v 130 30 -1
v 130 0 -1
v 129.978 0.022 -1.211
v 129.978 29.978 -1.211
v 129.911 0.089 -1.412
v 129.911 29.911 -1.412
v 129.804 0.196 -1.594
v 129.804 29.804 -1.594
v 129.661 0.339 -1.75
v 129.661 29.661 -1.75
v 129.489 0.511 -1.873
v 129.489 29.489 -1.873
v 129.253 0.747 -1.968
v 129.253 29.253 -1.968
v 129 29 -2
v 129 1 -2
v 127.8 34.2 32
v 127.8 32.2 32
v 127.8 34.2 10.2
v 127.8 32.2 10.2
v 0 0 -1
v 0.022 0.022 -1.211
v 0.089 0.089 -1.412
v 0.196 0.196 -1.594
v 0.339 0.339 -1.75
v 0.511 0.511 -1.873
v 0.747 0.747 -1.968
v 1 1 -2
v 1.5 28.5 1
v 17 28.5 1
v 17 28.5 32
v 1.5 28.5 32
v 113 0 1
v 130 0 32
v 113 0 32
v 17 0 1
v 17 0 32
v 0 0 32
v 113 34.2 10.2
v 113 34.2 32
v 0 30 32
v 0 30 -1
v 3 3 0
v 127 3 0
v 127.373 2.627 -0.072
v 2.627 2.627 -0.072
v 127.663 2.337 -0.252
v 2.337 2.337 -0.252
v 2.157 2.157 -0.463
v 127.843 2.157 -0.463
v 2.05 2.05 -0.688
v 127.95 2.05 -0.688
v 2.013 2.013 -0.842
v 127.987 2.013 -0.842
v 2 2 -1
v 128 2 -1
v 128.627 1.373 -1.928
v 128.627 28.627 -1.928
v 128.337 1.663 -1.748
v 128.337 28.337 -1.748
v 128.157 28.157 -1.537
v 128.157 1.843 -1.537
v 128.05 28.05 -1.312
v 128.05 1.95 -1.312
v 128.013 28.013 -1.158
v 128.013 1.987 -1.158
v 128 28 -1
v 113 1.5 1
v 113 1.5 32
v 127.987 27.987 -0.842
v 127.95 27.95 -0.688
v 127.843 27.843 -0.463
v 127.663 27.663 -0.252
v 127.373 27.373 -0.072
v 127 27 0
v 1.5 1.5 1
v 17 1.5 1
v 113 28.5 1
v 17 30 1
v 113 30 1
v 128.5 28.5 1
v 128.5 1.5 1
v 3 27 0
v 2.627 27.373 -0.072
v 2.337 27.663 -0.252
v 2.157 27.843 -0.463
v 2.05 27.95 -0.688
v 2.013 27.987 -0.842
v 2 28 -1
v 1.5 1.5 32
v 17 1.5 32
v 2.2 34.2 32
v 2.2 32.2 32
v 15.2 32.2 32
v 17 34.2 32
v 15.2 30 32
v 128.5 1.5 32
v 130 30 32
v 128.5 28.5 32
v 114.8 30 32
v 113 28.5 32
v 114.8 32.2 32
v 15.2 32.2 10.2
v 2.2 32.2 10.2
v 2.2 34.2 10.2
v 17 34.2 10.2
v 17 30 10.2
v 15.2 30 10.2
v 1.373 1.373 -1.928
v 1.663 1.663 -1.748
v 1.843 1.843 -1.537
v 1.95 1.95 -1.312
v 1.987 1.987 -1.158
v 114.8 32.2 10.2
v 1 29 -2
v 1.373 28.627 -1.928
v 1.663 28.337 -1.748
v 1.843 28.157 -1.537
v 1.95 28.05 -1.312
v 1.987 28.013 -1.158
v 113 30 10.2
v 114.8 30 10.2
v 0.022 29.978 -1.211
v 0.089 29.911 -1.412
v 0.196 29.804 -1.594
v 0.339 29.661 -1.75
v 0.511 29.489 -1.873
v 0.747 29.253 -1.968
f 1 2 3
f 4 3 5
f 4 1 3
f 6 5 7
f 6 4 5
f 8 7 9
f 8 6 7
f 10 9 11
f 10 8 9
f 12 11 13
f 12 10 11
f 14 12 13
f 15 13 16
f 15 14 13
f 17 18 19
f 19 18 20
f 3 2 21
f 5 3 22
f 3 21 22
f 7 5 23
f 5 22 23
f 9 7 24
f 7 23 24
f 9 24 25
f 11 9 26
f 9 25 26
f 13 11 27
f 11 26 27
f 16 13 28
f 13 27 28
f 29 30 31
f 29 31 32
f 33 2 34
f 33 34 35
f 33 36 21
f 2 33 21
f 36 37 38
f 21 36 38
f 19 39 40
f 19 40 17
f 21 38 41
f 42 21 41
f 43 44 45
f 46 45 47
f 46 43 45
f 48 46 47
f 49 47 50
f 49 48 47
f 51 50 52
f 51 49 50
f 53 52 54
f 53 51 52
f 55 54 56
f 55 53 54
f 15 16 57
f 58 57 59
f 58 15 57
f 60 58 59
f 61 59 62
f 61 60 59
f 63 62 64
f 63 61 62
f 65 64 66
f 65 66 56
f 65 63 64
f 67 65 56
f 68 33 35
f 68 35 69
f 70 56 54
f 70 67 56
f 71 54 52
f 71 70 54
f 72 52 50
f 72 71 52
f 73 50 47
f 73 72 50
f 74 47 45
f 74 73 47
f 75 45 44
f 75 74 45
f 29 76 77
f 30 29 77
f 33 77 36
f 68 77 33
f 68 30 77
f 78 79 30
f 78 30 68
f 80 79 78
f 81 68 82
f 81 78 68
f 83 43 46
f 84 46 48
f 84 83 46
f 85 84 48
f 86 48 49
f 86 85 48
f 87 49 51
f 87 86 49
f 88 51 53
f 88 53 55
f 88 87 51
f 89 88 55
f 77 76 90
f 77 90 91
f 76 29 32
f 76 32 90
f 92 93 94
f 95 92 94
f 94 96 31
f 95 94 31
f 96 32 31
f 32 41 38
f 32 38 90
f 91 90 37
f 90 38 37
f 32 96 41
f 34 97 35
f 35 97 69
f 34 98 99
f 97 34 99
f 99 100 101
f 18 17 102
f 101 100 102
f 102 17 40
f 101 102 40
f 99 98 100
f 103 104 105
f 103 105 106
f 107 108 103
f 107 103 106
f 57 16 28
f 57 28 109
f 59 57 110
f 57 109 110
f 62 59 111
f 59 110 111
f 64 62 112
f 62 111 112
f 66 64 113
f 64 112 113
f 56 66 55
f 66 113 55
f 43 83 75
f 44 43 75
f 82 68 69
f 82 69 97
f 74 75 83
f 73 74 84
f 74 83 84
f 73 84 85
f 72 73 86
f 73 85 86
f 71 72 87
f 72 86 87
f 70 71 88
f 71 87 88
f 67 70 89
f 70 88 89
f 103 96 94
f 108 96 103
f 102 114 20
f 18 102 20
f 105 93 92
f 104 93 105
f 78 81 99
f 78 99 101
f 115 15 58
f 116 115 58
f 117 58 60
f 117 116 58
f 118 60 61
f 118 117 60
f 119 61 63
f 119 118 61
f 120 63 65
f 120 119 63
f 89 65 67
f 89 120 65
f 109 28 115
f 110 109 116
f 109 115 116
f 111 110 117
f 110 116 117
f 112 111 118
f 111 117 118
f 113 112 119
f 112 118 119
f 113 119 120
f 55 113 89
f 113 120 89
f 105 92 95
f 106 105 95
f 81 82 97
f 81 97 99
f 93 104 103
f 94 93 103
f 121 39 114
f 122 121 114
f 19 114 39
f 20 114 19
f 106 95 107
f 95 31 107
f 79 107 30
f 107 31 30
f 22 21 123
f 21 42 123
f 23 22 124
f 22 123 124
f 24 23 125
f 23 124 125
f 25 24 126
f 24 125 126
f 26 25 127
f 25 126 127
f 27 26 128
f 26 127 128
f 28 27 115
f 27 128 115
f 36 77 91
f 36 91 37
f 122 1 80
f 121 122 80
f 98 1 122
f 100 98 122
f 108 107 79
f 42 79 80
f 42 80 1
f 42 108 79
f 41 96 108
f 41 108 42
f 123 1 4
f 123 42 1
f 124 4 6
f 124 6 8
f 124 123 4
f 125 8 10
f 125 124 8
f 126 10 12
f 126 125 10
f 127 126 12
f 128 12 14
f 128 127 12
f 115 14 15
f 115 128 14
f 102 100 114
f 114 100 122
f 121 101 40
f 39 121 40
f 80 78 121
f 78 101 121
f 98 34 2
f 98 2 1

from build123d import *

# Parameters (mm, degrees)
ESQUISSE1_W        = 130
ESQUISSE1_H        = 30
BOSS_EXTRU_1_DEPTH = 1
BOSS_EXTRU_2_DEPTH = 31
ESQUISSE5_W        = 1.8
ESQUISSE5_H        = 21.8
BOSS_EXTRU_4_DEPTH = 2.2
ESQUISSE6_W        = 14.8
ESQUISSE6_H        = 21.8
BOSS_EXTRU_5_DEPTH = 2
ESQUISSE3_W        = 130
ESQUISSE3_H        = 30
ESQUISSE3_W_2      = 126
ESQUISSE3_H_2      = 26
BOSS_EXTRU_3_DEPTH = 2
CONG_1_R           = 1


with BuildPart() as part:
    # Esquisse1 → Boss.-Extru.1 (new body)
    with BuildSketch(Plane.XY):
        with Locations((65, 15)):
            Rectangle(ESQUISSE1_W, ESQUISSE1_H)
    extrude(amount=BOSS_EXTRU_1_DEPTH)

    # Esquisse2 → Boss.-Extru.2 (add)
    with BuildSketch(Plane.XY.offset(1)):
        Polygon((128.5, 28.5), (113, 28.5), (113, 30), (130, 30), (130, 0), (113, 0), (113, 1.5), (128.5, 1.5), align=None)
        Polygon((1.5, 28.5), (1.5, 1.5), (17, 1.5), (17, 0), (0, 0), (0, 30), (17, 30), (17, 28.5), align=None)
    extrude(amount=BOSS_EXTRU_2_DEPTH)

    # Esquisse5 → Boss.-Extru.4 (add)
    with BuildSketch(Plane(origin=(0, 30, 0), x_dir=(1, 0, 0), z_dir=(0, 1, 0))):
        with Locations((16.1, -21.1)):
            Rectangle(ESQUISSE5_W, ESQUISSE5_H)
        with Locations((113.9, -21.1)):
            Rectangle(ESQUISSE5_W, ESQUISSE5_H)
    extrude(amount=BOSS_EXTRU_4_DEPTH)

    # Esquisse6 → Boss.-Extru.5 (add)
    with BuildSketch(Plane(origin=(0, 32.2, 0), x_dir=(1, 0, 0), z_dir=(0, 1, 0))):
        with Locations((9.6, -21.1)):
            Rectangle(ESQUISSE6_W, ESQUISSE6_H)
        with Locations((120.4, -21.1)):
            Rectangle(ESQUISSE6_W, ESQUISSE6_H)
    extrude(amount=BOSS_EXTRU_5_DEPTH)

    # Esquisse3 → Boss.-Extru.3 (add)
    with BuildSketch(Plane(origin=(0, 0, 0), x_dir=(-1, 0, 0), z_dir=(0, 0, -1))):
        with Locations((-65, 15)):
            Rectangle(ESQUISSE3_W, ESQUISSE3_H)
        with Locations((-65, 15)):
            Rectangle(ESQUISSE3_W_2, ESQUISSE3_H_2, mode=Mode.SUBTRACT)
    extrude(amount=BOSS_EXTRU_3_DEPTH)

    # Congé1
    cong_1_edges = [part.edges().sort_by_distance(p)[0] for p in [
        (65, 28, 0),
        (2, 15, 0),
        (65, 2, 0),
        (128, 15, 0),
        (2, 15, -2),
        (65, 28, -2),
        (128, 15, -2),
        (65, 2, -2),
        (130, 15, -2),
        (65, 30, -2),
        (0, 15, -2),
        (65, 0, -2),
    ]]
    fillet(cong_1_edges, radius=CONG_1_R - 0.0001)  # a hair under: the kernel refuses the full size


solid = part.part
